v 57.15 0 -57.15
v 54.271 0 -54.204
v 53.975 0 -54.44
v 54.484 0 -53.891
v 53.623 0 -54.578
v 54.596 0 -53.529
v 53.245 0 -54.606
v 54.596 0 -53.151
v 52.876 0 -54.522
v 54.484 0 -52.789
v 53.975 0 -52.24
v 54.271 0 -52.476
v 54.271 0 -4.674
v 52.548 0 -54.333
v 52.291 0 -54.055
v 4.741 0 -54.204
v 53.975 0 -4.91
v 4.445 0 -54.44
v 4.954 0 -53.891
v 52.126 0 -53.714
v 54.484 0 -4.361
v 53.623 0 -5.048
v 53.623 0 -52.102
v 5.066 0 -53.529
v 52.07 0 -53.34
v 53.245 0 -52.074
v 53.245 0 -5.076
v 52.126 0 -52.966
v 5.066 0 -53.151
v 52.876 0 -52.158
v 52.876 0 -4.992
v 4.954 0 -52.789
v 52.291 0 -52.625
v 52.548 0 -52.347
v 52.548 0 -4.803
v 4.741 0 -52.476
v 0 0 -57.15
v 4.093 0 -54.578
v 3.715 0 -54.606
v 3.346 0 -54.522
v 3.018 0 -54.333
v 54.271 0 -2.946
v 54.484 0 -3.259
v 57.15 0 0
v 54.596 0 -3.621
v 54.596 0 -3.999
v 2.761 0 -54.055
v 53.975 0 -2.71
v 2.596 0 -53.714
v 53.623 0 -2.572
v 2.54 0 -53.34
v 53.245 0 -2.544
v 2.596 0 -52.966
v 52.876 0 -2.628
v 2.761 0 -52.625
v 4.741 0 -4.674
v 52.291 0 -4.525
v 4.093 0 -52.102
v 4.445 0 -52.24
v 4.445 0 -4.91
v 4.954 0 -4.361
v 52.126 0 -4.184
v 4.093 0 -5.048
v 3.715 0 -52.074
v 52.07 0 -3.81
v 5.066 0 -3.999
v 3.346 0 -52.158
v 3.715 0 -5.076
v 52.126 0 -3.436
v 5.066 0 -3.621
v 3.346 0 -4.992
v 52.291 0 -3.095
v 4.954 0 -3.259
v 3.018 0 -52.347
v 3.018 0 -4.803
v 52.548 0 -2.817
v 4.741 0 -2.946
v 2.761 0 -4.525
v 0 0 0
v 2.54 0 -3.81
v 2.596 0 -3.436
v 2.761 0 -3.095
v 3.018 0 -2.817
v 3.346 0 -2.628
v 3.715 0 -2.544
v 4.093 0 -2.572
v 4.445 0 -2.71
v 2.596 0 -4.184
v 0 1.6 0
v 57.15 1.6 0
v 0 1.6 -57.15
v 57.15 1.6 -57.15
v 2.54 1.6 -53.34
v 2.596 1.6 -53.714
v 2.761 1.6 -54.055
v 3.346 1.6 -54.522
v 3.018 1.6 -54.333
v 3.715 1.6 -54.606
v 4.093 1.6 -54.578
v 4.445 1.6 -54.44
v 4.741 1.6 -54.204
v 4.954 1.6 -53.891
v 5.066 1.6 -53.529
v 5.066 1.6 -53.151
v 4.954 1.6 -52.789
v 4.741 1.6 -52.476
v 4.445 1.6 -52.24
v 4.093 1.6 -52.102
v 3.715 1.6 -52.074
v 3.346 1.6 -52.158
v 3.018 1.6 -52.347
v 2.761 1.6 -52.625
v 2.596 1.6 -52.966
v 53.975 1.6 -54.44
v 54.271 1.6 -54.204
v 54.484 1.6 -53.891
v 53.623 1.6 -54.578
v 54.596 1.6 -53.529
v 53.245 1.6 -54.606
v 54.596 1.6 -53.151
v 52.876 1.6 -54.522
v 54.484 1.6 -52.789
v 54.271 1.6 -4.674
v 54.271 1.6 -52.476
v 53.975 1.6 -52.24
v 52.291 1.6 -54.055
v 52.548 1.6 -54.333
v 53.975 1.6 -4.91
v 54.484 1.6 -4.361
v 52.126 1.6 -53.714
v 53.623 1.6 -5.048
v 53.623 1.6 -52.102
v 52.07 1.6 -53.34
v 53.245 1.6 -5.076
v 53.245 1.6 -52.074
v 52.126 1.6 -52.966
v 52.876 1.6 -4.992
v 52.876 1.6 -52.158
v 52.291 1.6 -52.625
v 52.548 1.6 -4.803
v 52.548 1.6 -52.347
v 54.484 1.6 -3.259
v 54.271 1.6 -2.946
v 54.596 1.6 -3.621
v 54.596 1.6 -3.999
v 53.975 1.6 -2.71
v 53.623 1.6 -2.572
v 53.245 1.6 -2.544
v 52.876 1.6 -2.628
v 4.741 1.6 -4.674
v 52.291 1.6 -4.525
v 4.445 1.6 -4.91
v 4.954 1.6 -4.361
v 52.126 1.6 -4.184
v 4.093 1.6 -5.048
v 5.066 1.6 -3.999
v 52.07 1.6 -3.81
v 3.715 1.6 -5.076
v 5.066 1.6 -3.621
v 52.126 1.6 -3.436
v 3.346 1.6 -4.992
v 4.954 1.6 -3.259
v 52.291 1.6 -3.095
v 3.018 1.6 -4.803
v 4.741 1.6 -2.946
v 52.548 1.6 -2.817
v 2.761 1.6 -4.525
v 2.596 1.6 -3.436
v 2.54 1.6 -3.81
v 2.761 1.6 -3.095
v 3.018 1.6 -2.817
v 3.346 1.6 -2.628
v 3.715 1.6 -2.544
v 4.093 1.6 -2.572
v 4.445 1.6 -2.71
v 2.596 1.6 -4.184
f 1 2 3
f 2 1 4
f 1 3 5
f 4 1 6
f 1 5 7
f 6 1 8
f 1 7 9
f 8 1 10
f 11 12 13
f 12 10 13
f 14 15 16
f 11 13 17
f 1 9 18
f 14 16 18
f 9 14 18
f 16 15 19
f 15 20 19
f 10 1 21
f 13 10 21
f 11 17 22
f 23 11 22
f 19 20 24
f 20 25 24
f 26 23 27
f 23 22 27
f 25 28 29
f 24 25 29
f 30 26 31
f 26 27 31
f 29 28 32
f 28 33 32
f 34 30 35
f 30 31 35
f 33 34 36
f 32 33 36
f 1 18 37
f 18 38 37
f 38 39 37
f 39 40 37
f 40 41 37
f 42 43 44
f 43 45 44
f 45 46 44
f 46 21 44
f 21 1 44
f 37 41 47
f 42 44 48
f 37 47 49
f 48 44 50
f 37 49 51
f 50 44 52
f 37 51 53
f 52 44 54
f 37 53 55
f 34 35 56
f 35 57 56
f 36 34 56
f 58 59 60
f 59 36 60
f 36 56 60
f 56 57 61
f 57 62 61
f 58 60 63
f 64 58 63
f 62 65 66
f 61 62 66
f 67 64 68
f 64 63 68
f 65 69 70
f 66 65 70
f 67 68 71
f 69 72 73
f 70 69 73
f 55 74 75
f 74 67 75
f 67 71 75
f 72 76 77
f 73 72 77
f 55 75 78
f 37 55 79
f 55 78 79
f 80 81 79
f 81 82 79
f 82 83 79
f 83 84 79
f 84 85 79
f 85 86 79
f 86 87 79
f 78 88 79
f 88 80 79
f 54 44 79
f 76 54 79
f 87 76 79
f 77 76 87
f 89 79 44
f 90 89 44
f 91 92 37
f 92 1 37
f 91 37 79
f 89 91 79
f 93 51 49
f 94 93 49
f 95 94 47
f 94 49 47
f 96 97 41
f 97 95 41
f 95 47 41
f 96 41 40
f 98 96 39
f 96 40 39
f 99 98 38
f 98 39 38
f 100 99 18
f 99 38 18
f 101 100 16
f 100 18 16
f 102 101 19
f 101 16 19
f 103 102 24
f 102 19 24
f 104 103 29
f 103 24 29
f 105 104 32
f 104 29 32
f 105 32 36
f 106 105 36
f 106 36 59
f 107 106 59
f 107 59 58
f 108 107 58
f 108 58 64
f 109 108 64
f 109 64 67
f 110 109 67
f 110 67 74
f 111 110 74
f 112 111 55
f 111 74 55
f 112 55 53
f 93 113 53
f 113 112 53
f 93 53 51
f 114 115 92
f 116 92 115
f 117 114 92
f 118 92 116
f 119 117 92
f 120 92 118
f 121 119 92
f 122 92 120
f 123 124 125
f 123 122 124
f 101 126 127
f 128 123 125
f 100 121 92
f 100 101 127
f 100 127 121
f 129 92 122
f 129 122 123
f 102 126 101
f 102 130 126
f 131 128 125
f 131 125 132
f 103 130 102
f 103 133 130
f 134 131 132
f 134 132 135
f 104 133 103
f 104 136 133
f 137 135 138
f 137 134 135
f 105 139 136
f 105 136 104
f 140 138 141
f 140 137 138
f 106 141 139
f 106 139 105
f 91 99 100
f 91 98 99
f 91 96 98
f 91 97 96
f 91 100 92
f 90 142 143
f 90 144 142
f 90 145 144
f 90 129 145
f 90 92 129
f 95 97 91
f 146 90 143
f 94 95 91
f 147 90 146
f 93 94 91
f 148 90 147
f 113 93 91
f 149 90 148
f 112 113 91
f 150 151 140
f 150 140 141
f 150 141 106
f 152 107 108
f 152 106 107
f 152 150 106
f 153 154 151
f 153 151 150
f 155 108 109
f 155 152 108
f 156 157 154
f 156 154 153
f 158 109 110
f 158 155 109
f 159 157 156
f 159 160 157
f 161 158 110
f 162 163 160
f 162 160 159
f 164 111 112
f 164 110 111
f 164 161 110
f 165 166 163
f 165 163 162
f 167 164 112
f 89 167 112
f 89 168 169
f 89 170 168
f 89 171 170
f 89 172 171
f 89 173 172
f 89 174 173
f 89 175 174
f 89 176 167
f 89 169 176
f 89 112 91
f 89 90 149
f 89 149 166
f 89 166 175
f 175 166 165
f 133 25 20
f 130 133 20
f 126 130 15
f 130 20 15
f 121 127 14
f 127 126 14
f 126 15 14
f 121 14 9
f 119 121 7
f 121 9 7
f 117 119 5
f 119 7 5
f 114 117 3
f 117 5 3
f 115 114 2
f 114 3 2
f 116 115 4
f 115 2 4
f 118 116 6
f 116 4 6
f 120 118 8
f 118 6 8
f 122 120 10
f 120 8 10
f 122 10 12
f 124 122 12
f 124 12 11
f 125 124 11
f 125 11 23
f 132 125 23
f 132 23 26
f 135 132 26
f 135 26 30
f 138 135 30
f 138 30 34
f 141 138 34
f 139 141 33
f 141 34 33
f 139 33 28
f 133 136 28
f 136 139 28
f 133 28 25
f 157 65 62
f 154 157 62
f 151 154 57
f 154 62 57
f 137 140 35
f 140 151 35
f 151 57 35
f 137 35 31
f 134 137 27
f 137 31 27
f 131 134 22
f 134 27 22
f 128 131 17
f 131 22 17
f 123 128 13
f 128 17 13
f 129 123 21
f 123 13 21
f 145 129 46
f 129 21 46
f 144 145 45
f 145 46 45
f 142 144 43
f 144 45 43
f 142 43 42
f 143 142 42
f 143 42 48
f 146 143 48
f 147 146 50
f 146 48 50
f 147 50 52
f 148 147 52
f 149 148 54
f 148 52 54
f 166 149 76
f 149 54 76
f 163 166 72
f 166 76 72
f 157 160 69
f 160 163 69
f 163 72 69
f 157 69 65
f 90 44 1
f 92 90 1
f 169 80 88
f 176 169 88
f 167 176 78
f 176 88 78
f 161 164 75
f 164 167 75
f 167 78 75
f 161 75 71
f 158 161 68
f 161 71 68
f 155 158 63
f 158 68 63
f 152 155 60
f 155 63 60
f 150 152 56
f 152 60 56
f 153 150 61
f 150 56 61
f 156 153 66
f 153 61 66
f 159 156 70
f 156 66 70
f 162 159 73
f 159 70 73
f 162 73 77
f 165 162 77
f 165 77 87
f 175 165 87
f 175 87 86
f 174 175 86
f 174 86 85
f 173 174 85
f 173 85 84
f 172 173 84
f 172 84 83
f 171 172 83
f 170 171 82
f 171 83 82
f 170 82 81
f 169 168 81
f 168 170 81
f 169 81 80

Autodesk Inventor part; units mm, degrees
ref_plane "YZ Plane" through (0, 0, 0) normal (1, 0, 0) x (0, 1, 0)
ref_plane "XZ Plane" through (0, 0, 0) normal (0, 1, 0) x (-1, 0, 0)
ref_plane "XY Plane" through (0, 0, 0) normal (0, 0, 1) x (1, 0, 0)
sketch "Sketch1" plane through (0, 0, 0) normal (0, 1, 0) x (-1, 0, 0)
  line L0 (0, 0) -> (-57.15, 0)
  line L1 (-57.15, 0) -> (-57.15, -57.15)
  line L2 (-57.15, -57.15) -> (0, -57.15)
  line L3 (0, -57.15) -> (0, 0)
  circle A0 centre (-3.81, -3.81) radius 1.27
  line L4 (-28.575, 0) -> (-28.575, -57.15) construction
  line L5 (0, -28.575) -> (-57.15, -28.575) construction
  circle A1 centre (-3.81, -53.34) radius 1.27
  circle A2 centre (-53.34, -3.81) radius 1.27
  circle A3 centre (-53.34, -53.34) radius 1.27
  dimension "d0" = 57.15
  dimension "d1" = 57.15
  dimension "d2" = 3.81
  dimension "d3" = 2.54
  dimension "d4" = 3.81
extrude "Extrusion1" add sketch "Sketch1" along normal blind 1.6
sketch "Sketch2" plane through (0, 1.6, 0) normal (0, 1, 0) x (1, 0, 0)
  circle A0 centre (53.34, 53.34) radius 1.27 projected
  circle A1 centre (53.34, 3.81) radius 1.27 projected
  circle A2 centre (3.81, 53.34) radius 1.27 projected
  circle A3 centre (3.81, 3.81) radius 1.27 projected
  line L0 (0, 0) -> (57.15, 0) projected
  line L1 (57.15, 0) -> (57.15, 57.15) projected
  line L2 (57.15, 57.15) -> (0, 57.15) projected
  line L3 (0, 57.15) -> (0, 0) projected
  dimension "d7" = 49.53
properties part number "SFE PCB"
